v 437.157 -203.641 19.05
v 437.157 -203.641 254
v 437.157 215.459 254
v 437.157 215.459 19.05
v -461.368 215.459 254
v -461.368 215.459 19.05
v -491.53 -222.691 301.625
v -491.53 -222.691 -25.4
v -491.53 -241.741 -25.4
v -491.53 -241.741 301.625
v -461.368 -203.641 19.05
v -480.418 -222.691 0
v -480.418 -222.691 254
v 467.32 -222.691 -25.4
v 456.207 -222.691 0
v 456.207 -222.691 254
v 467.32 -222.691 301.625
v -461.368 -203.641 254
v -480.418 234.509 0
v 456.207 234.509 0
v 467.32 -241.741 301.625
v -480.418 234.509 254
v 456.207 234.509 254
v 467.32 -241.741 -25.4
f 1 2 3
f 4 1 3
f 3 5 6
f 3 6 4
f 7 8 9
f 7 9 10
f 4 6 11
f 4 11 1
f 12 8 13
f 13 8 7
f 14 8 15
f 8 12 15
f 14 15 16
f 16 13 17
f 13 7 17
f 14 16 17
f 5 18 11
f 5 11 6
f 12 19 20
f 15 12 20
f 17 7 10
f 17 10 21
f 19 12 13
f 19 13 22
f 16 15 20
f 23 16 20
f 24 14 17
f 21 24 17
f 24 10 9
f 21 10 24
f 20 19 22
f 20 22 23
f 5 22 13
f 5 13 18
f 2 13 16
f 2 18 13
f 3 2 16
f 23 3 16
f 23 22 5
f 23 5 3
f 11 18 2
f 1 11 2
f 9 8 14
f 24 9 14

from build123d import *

# Parameters (mm, degrees)
F0_W     = 936.625
F0_H     = 457.2
F1_DEPTH = 254
F2_W     = 898.525
F2_H     = 419.1
F3_DEPTH = 234.95
F4_W     = 958.85
F4_H     = 327.025
F5_DEPTH = 19.05


with BuildPart() as f1:
    # F0 (on Top) → F1 (new body)
    with BuildSketch(Plane.XY):
        with Locations((-12.105351, 5.909053)):
            Rectangle(F0_W, F0_H)
    extrude(amount=F1_DEPTH)

    # F2 (on face) → F3 (cut)
    with BuildSketch(Plane.XY.offset(254)):
        with Locations((-12.105351, 5.909053)):
            Rectangle(F2_W, F2_H)
    extrude(amount=-F3_DEPTH, mode=Mode.SUBTRACT)

    # F4 (on face) → F5 (join)
    with BuildSketch(Plane.XZ.offset(222.690947)):
        with Locations((-12.105351, 138.1125)):
            Rectangle(F4_W, F4_H)
    extrude(amount=F5_DEPTH)


solid = f1.part
